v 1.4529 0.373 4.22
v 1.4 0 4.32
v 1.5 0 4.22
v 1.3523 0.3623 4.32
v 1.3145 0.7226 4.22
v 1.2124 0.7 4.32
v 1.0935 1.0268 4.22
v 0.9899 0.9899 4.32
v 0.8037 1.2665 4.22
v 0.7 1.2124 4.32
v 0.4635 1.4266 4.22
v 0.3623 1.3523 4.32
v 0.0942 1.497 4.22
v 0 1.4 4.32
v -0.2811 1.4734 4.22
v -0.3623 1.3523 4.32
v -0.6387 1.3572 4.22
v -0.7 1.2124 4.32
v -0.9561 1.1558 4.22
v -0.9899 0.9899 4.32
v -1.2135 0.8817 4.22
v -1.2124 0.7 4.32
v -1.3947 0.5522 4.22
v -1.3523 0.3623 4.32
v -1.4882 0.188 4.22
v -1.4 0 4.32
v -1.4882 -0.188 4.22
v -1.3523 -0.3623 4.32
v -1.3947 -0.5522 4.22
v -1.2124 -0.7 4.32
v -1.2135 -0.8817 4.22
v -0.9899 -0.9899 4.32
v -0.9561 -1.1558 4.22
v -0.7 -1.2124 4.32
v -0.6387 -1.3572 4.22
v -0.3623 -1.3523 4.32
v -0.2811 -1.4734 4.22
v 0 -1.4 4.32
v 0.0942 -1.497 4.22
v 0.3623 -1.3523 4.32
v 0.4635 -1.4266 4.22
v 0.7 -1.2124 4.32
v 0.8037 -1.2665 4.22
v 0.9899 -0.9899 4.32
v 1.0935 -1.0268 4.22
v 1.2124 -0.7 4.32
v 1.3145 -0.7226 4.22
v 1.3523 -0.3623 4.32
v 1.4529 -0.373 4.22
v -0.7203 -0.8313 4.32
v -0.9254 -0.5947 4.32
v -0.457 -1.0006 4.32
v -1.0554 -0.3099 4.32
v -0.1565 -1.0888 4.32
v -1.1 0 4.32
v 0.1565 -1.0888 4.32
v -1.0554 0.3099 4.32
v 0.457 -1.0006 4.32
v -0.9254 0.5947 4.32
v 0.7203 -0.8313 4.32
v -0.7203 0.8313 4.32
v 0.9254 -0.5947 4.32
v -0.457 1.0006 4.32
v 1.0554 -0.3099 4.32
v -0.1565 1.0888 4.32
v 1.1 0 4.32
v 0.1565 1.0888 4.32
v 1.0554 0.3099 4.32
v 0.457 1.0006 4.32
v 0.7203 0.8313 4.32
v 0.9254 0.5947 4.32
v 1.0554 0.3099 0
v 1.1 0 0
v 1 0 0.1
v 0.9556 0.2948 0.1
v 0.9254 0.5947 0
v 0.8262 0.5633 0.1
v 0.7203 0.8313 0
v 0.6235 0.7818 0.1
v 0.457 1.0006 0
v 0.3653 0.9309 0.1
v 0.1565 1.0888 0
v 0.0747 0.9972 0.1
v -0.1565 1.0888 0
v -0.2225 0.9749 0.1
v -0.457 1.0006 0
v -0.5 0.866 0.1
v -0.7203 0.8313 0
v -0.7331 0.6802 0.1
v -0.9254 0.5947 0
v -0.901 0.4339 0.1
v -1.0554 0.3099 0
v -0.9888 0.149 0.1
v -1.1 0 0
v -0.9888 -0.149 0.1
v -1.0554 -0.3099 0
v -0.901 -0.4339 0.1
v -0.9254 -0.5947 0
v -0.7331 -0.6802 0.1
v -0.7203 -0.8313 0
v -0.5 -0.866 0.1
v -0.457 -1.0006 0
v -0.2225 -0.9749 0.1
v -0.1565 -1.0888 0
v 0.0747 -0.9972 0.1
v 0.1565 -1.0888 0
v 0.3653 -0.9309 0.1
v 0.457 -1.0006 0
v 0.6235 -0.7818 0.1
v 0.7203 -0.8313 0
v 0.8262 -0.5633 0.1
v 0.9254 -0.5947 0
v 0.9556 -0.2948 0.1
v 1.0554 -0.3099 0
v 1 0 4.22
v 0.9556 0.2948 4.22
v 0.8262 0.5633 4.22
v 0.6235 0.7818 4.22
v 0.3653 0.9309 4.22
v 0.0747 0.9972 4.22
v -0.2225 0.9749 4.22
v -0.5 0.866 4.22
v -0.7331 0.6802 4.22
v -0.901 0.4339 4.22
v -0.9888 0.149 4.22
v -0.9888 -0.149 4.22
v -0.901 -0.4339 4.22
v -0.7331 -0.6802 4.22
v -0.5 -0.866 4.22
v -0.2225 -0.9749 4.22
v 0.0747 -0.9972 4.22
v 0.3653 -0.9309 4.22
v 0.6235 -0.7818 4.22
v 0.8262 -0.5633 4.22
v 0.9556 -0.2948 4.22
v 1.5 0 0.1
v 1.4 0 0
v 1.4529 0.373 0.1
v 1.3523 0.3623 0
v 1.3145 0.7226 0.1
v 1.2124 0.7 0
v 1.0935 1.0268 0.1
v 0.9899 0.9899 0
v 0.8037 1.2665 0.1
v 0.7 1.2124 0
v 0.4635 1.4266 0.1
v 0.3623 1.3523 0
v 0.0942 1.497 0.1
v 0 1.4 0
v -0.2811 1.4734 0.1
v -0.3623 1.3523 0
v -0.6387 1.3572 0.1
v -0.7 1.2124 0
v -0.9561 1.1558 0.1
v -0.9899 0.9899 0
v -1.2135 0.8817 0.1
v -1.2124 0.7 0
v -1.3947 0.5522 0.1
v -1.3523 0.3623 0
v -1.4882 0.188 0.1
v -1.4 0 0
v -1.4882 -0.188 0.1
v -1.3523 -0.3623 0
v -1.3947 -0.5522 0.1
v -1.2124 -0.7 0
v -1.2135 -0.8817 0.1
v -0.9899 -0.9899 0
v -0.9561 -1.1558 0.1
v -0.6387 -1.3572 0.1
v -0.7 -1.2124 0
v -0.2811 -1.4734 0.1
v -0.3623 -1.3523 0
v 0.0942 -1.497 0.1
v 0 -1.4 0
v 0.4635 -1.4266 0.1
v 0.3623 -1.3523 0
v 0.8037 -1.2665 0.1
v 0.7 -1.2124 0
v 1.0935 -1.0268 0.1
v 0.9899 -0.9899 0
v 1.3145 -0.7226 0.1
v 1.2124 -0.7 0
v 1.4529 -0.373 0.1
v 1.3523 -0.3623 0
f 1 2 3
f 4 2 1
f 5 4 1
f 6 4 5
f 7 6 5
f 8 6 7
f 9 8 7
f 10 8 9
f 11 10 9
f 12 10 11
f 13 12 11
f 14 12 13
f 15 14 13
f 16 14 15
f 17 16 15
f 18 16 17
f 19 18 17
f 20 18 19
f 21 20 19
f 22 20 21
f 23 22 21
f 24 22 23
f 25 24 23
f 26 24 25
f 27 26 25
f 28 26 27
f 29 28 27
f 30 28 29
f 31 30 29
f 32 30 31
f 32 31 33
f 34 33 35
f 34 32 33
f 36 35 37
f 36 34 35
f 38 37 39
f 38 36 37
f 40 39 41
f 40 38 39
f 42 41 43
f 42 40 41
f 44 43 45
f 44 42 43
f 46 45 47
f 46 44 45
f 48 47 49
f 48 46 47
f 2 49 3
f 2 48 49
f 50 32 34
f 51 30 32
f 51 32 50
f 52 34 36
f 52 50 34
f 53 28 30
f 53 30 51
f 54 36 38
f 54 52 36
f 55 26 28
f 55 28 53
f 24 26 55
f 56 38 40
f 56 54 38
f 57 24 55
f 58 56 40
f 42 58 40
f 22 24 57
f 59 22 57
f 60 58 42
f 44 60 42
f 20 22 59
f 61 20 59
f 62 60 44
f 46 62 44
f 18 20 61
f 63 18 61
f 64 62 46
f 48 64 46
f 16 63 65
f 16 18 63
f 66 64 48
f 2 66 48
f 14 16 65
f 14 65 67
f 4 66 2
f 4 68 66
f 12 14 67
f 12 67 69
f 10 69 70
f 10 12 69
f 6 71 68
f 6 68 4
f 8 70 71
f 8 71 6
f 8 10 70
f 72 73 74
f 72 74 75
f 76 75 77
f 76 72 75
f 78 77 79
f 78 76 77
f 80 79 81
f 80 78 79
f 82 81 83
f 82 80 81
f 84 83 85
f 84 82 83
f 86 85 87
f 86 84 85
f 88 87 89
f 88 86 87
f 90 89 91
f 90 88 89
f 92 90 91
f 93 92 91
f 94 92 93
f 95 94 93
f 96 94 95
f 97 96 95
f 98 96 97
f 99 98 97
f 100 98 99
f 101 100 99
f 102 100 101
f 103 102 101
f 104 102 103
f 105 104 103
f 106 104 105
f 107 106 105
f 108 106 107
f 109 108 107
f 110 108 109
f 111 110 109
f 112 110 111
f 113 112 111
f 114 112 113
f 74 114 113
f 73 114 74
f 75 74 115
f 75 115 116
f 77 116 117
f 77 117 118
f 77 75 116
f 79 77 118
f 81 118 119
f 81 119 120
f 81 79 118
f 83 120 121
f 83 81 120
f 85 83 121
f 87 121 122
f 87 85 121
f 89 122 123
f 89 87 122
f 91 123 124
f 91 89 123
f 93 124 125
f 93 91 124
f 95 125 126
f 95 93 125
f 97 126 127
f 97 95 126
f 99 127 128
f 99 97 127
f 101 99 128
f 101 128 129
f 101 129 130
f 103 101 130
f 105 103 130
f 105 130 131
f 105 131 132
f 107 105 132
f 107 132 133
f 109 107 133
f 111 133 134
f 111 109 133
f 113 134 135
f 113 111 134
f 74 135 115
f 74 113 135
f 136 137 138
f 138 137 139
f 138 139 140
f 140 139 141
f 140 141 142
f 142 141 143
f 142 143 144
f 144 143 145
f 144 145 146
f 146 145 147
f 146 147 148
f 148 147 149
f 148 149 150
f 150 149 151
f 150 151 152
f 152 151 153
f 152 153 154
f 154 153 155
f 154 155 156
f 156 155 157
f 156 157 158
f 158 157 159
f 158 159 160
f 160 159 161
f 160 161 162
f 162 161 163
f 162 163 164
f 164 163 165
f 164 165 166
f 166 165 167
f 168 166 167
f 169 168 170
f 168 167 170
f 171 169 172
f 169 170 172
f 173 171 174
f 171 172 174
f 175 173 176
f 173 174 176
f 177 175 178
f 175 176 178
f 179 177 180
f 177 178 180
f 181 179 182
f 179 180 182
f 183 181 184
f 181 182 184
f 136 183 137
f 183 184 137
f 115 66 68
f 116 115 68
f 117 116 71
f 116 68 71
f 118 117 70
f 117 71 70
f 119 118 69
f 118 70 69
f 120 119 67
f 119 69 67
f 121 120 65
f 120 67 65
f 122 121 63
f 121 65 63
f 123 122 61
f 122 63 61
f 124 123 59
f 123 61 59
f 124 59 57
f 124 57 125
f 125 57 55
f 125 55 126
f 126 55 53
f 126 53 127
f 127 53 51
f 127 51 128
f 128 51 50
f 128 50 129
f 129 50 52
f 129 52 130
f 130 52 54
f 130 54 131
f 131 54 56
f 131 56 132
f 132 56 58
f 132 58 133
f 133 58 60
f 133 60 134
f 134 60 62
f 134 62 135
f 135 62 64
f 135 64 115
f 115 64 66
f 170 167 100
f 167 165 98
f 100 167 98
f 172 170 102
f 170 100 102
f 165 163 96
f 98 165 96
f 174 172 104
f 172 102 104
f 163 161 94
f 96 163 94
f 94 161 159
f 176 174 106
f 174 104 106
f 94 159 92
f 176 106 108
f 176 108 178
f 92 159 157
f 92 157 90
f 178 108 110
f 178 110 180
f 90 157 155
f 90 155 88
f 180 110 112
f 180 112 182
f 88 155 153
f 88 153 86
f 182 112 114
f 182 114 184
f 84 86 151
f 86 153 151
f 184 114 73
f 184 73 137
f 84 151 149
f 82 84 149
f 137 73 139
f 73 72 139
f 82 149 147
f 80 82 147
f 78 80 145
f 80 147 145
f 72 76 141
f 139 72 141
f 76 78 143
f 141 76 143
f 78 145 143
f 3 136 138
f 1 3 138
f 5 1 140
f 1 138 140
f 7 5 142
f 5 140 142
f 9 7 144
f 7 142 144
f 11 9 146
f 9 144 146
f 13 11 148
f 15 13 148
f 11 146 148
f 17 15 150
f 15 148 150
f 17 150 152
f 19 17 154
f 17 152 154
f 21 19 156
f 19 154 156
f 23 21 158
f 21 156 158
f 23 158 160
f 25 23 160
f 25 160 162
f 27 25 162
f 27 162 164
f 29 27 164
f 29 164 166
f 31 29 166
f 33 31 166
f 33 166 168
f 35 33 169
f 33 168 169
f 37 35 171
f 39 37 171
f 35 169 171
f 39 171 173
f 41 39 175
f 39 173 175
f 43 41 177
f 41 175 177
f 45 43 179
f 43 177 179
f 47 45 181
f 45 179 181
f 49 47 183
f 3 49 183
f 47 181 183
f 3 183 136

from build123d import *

# Parameters (mm, degrees)
SKIZZE1_R                       = 1.5
SKIZZE1_R_2                     = 1
AUFSATZ_LINEAR_AUSTRAGEN1_DEPTH = 4.32
FASE1_SIZE                      = 0.1


with BuildPart() as part:
    # Skizze1 → Aufsatz-Linear austragen1 (new body)
    with BuildSketch(Plane.XY):
        Circle(SKIZZE1_R)
        Circle(SKIZZE1_R_2, mode=Mode.SUBTRACT)
    extrude(amount=AUFSATZ_LINEAR_AUSTRAGEN1_DEPTH)

    # Fase1
    fase1_edges = [part.edges().sort_by_distance(p)[0] for p in [
        (-1.5, 0, 0),
        (-1.5, 0, 4.32),
        (-1, 0, 0),
        (-1, 0, 4.32),
    ]]
    chamfer(fase1_edges, length=FASE1_SIZE)


solid = part.part
